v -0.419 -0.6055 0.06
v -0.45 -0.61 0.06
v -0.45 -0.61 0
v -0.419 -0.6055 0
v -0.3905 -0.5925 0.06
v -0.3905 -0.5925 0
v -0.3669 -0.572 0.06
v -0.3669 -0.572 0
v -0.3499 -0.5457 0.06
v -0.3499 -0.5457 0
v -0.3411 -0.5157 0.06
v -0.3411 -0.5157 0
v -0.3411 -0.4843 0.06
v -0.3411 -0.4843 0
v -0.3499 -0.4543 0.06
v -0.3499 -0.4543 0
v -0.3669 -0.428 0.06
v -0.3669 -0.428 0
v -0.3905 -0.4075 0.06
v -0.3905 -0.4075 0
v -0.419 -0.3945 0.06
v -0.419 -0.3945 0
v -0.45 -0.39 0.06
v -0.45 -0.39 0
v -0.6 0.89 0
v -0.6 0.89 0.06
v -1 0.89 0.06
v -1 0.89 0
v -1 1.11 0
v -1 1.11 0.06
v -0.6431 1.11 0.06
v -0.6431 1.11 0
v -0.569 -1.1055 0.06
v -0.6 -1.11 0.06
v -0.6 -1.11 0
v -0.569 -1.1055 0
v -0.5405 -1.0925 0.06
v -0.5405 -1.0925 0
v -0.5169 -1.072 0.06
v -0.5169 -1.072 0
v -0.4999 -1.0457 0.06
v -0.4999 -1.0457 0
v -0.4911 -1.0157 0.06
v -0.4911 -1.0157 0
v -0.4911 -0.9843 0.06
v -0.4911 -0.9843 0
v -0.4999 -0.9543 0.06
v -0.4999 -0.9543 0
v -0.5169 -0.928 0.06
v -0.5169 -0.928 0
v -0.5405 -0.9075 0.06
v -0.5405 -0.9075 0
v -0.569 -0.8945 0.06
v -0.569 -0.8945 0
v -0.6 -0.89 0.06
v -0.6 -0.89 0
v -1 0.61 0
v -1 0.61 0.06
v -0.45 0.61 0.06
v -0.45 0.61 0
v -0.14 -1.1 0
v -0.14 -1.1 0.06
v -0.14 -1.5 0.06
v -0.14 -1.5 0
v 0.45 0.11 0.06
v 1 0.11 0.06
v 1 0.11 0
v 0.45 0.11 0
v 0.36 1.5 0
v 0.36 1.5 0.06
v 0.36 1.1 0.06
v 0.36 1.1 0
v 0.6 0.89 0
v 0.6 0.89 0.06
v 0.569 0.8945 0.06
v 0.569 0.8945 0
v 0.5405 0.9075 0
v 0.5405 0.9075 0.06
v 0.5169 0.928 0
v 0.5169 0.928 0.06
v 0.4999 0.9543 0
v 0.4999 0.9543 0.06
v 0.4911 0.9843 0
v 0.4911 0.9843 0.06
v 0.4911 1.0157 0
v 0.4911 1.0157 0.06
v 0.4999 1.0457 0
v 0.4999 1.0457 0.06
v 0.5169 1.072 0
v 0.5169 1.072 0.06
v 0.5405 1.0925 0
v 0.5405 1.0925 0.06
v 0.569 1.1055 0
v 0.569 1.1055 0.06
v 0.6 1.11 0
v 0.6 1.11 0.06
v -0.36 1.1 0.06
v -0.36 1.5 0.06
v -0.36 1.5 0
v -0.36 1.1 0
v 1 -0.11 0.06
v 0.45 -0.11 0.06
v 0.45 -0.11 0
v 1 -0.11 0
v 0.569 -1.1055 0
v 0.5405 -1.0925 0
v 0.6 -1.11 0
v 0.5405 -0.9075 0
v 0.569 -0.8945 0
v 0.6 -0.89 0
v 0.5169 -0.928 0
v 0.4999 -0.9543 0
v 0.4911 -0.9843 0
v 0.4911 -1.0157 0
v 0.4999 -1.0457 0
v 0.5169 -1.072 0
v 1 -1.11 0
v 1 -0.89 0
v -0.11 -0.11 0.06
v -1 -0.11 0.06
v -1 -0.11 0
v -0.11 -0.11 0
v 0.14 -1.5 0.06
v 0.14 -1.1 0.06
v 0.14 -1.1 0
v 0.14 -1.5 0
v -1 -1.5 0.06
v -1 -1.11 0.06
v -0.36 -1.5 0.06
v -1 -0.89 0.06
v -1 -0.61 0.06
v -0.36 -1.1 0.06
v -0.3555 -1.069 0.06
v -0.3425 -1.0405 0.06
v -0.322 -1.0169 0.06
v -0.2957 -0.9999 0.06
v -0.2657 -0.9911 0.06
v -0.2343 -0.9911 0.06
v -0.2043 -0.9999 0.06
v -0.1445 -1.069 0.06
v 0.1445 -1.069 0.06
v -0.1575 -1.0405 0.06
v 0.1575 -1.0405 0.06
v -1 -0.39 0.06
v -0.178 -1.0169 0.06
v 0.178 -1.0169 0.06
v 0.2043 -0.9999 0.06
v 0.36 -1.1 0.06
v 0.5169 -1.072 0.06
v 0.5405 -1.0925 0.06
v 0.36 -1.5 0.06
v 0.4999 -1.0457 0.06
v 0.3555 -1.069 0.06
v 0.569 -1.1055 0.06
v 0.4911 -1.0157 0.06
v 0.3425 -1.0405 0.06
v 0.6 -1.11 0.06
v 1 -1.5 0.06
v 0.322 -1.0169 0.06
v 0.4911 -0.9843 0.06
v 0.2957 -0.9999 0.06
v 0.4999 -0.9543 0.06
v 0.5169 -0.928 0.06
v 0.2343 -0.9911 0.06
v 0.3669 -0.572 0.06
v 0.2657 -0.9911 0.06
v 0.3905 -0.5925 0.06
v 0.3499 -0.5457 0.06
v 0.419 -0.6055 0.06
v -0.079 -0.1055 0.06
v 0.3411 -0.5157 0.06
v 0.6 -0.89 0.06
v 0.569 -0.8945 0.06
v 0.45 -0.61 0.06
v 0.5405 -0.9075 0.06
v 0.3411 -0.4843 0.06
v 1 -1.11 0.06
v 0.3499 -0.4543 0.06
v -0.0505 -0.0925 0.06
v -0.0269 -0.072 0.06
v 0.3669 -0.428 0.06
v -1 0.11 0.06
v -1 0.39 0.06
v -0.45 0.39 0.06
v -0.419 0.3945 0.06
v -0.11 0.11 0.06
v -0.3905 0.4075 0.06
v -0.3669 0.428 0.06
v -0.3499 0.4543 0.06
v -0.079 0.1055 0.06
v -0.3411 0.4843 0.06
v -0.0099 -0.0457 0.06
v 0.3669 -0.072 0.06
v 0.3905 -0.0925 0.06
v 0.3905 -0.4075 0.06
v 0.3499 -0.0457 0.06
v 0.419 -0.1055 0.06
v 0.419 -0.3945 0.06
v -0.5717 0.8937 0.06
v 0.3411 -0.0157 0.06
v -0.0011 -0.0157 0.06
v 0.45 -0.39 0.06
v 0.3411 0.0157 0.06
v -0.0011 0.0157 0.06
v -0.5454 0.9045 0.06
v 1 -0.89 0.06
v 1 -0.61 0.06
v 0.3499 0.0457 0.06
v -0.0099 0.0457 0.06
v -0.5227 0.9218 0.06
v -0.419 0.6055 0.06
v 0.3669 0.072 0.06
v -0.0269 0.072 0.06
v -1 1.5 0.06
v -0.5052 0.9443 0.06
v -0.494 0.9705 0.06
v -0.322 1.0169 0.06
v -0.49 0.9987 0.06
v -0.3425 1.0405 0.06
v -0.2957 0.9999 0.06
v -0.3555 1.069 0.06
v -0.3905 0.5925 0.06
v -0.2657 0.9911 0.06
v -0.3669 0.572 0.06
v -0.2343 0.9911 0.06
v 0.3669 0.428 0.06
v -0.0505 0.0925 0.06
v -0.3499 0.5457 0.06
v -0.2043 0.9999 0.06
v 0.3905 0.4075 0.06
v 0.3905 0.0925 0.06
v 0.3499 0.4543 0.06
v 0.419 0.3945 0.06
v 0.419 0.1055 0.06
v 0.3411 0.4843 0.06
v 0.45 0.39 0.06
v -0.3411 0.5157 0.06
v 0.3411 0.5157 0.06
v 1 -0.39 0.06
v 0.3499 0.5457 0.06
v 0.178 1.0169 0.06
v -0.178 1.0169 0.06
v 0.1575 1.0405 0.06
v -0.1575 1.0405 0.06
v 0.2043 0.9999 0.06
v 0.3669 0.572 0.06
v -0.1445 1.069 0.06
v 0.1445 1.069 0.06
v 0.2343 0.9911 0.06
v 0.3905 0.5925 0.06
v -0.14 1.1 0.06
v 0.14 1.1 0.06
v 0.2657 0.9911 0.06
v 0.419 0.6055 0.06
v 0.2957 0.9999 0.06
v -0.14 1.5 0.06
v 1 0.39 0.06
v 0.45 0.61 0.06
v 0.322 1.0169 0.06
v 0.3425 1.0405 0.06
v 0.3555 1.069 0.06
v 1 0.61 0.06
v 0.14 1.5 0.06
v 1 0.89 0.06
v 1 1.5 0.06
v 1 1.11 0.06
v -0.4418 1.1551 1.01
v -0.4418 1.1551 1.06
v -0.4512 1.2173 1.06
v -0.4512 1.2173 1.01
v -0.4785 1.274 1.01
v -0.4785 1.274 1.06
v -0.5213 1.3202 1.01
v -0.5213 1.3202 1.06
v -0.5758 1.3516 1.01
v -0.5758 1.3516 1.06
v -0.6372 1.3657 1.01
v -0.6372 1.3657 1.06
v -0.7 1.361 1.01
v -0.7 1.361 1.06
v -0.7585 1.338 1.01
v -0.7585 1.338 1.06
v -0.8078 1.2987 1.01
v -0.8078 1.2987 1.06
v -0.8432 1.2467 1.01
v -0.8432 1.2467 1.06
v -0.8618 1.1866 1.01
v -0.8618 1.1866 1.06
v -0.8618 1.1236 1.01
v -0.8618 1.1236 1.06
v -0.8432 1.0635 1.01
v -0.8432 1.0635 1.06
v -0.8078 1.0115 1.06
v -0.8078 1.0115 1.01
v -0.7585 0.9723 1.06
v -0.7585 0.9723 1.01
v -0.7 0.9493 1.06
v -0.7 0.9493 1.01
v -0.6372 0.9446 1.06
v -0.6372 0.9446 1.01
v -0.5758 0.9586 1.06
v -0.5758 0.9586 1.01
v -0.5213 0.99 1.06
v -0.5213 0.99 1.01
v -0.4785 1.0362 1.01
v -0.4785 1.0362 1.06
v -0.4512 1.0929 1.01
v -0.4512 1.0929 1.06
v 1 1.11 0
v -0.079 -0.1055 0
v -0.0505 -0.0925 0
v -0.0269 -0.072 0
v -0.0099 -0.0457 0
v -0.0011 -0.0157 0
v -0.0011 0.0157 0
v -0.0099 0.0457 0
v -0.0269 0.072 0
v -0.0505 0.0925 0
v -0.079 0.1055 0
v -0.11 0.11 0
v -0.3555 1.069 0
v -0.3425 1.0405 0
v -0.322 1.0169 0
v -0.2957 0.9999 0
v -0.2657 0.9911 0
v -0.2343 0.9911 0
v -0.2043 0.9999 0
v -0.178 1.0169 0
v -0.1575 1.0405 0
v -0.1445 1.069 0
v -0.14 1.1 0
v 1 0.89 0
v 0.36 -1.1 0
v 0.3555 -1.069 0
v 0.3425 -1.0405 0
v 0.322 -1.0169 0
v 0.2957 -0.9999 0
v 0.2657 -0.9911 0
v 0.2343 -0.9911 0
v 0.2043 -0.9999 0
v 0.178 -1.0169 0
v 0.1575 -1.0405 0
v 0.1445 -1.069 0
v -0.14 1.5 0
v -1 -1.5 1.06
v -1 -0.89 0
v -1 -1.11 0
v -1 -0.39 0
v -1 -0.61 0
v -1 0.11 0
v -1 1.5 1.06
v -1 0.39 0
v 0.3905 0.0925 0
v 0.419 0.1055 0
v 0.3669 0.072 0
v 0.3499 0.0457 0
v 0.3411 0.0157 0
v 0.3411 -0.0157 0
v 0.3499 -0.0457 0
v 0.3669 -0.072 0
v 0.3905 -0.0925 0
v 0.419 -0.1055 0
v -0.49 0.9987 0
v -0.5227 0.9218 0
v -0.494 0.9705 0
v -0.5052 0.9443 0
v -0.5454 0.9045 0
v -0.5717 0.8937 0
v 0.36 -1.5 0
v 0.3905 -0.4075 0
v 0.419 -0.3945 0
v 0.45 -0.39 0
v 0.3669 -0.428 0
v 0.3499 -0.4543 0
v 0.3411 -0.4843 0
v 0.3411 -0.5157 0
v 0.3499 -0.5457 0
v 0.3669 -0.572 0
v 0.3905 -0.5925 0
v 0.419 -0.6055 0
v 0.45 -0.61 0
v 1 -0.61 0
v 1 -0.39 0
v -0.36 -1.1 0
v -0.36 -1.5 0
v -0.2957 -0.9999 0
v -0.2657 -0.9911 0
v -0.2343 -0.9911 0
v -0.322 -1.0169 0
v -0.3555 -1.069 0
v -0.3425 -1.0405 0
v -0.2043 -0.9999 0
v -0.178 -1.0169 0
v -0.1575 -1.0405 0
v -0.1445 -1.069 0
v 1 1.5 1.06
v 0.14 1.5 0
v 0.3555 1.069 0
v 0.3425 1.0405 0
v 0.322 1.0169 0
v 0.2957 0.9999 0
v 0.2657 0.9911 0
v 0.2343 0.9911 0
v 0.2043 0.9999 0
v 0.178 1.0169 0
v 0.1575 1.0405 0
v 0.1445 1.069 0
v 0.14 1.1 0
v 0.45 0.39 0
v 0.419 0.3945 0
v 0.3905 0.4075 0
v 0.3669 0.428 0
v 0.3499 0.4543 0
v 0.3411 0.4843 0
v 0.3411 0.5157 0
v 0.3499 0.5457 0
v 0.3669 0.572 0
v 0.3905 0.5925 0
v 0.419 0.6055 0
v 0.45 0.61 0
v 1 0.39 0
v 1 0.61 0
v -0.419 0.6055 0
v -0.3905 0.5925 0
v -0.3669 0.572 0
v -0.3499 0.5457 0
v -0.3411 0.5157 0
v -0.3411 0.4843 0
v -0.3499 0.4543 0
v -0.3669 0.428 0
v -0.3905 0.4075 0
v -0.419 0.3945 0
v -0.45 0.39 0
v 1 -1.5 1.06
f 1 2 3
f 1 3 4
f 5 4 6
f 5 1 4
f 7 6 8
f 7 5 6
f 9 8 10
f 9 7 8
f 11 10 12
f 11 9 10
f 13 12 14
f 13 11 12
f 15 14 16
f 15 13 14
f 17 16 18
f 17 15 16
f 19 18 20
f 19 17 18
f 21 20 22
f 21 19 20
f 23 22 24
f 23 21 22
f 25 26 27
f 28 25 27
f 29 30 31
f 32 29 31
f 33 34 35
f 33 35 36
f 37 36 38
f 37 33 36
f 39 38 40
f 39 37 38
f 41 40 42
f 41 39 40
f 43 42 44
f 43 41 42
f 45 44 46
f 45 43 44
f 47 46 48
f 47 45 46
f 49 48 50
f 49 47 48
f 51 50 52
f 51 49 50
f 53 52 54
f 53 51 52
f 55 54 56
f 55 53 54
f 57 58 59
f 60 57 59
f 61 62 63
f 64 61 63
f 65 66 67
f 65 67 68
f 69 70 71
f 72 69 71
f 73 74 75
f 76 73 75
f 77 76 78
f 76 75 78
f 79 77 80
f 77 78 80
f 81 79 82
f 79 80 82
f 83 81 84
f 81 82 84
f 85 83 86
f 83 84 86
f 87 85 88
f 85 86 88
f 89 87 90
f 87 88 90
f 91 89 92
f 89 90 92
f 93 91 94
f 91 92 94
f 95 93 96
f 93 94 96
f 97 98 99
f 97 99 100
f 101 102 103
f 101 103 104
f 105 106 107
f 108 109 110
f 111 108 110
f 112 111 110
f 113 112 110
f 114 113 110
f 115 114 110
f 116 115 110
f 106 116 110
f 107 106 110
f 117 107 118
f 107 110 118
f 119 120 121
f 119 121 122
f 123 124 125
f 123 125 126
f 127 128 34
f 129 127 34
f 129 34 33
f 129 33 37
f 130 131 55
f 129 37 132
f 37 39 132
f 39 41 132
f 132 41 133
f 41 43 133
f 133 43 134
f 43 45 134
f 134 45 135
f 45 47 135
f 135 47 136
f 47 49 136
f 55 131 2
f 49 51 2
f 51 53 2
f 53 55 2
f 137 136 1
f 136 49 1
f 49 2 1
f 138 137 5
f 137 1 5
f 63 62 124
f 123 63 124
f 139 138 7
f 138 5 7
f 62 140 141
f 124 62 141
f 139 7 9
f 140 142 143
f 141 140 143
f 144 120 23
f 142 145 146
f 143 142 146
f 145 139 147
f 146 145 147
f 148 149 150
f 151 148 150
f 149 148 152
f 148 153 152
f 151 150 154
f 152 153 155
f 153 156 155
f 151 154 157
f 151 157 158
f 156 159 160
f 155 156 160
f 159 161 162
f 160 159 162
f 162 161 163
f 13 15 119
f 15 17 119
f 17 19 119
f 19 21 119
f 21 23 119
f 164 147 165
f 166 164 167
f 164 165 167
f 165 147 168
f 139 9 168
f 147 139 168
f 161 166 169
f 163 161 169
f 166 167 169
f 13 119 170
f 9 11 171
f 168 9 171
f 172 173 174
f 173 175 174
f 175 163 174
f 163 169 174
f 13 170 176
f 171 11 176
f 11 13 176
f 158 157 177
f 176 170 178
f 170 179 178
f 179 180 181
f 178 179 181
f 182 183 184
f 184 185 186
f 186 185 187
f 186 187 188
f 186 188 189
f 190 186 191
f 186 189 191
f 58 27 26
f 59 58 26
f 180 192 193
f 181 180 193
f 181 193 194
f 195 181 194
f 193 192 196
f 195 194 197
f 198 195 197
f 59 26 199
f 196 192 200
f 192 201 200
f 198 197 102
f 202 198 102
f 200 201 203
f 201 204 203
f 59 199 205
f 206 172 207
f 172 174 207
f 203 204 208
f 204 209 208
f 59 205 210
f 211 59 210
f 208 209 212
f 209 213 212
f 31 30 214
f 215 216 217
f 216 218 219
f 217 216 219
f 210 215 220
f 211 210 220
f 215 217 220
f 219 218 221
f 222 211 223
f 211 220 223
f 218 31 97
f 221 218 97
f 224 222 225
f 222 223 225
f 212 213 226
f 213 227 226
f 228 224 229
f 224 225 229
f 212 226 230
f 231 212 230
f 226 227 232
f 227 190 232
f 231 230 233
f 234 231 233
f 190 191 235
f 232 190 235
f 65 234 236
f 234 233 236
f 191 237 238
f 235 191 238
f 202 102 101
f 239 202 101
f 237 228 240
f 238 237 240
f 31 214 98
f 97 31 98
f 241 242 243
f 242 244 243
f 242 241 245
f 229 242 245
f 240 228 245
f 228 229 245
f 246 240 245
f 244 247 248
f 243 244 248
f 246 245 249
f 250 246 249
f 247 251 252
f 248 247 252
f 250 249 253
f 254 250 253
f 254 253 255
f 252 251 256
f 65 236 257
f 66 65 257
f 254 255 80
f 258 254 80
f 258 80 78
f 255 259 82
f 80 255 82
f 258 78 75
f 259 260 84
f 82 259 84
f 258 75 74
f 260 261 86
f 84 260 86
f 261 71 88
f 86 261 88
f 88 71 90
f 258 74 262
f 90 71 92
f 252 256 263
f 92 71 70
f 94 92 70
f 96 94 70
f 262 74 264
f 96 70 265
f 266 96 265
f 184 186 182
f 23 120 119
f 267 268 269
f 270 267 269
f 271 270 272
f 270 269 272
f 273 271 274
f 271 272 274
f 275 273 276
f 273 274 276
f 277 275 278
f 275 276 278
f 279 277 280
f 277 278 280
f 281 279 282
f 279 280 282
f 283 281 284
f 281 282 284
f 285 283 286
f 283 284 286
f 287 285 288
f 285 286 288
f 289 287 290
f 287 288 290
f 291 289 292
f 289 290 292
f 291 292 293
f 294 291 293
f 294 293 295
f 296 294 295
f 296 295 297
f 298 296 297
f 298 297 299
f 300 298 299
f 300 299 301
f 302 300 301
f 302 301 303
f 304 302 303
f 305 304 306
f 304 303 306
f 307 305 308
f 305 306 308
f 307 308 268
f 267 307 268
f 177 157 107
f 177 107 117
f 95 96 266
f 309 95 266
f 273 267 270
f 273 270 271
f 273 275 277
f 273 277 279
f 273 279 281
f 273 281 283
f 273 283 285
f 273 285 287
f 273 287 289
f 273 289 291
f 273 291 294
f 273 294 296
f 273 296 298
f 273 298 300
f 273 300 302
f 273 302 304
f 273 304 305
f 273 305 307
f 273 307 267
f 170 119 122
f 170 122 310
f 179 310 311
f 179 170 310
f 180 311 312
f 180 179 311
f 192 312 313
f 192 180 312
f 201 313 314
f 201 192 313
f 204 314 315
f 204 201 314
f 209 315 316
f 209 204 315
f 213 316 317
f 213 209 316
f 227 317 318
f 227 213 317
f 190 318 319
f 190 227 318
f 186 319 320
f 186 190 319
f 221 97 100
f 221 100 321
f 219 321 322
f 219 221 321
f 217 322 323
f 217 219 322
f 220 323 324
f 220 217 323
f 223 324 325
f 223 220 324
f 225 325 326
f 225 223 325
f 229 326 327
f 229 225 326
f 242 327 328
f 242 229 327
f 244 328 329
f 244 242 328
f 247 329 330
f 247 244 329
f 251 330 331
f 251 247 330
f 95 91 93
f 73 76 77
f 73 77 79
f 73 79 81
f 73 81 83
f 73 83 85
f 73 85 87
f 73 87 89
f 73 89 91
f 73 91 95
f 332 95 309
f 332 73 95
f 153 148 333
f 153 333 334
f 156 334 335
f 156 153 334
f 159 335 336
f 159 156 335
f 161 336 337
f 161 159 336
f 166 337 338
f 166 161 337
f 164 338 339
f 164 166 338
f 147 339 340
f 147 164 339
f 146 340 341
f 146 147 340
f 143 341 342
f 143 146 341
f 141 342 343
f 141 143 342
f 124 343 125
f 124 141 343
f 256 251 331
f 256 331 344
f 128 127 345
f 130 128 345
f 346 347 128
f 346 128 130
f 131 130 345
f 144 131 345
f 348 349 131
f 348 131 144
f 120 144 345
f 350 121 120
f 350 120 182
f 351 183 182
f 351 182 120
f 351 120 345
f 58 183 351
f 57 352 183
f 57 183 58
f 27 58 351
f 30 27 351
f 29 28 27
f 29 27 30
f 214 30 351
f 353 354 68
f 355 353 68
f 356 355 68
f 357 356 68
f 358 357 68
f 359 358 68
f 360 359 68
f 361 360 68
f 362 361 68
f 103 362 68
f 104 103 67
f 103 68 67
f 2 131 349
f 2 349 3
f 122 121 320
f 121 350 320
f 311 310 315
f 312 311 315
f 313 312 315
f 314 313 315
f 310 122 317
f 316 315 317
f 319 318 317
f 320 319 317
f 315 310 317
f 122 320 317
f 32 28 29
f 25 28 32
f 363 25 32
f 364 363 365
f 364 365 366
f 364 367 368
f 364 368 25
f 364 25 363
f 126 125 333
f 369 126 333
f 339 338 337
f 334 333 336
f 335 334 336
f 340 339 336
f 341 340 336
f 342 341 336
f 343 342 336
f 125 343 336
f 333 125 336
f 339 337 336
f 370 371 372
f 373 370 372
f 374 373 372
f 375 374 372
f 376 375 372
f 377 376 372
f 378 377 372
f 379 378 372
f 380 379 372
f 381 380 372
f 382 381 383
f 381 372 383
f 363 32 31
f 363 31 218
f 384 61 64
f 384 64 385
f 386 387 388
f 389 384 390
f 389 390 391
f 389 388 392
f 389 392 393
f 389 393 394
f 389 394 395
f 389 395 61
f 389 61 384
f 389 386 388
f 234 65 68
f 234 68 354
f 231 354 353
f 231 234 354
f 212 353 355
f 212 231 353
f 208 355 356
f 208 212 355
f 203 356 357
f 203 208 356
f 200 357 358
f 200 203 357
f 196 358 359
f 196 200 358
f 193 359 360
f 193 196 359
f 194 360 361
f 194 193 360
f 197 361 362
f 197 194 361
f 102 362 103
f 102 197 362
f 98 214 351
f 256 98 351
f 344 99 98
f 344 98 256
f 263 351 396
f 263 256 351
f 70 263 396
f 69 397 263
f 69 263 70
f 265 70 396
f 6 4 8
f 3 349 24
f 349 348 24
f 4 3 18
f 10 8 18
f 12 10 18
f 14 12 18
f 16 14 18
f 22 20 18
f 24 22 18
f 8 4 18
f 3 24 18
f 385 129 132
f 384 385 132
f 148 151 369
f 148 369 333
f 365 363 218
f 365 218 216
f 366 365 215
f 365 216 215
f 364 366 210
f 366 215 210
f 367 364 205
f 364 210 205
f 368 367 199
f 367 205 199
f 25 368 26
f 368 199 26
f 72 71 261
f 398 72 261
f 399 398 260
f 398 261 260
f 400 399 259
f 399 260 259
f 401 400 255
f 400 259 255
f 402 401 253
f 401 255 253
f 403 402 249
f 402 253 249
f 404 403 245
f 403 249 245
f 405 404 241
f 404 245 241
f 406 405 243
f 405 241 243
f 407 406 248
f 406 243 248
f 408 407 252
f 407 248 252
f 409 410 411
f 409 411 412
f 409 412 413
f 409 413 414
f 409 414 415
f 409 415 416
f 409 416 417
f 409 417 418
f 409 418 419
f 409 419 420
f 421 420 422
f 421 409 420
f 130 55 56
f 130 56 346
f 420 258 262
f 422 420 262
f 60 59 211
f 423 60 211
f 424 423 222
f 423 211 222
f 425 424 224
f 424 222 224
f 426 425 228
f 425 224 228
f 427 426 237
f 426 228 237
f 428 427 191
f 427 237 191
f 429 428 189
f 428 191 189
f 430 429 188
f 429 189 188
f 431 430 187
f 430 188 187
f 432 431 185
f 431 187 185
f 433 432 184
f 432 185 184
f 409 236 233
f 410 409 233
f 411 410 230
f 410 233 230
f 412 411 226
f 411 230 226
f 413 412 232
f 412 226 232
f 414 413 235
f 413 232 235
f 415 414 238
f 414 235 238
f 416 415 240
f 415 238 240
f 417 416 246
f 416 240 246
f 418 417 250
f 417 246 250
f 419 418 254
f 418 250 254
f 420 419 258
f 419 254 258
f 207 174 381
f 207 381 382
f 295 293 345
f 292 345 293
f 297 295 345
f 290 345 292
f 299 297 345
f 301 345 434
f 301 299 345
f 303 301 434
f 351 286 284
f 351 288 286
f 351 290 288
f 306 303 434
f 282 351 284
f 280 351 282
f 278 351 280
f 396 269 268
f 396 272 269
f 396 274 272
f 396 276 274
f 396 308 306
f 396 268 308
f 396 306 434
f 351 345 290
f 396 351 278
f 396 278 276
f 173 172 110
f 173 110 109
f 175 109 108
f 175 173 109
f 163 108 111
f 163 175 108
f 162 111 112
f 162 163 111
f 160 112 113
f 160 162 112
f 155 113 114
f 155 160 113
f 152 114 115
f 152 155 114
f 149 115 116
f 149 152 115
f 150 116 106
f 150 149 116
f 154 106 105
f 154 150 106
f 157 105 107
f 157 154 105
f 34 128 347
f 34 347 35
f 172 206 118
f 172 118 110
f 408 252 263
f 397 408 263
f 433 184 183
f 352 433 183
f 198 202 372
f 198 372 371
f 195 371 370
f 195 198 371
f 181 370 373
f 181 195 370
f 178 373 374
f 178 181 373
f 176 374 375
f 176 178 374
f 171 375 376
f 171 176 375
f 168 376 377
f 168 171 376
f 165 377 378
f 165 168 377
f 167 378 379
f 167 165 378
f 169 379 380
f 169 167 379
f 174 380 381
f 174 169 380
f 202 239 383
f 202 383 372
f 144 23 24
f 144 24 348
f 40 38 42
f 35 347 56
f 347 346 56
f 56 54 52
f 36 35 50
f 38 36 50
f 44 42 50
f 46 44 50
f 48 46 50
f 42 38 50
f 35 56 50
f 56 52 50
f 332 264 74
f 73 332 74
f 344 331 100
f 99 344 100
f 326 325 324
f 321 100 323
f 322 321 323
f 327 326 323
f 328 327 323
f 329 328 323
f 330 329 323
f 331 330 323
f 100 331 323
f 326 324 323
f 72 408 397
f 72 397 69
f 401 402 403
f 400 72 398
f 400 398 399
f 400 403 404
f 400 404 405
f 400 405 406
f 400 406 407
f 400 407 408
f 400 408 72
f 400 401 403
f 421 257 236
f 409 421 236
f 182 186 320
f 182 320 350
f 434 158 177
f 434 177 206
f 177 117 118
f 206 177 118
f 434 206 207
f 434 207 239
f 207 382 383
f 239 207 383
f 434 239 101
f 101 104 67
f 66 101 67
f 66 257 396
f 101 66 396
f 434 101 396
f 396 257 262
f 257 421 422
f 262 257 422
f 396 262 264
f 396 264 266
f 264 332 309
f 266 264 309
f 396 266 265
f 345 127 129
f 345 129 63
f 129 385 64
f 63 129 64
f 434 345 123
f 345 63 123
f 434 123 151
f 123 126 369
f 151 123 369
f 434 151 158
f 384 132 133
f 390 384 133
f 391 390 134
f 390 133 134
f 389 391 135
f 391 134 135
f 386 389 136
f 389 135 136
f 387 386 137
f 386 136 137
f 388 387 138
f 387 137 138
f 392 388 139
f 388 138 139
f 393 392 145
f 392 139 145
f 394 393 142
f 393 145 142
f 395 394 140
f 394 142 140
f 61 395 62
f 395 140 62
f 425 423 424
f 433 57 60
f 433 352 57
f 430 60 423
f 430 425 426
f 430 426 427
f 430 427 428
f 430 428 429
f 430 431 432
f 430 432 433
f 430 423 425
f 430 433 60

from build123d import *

# Parameters (mm, degrees)
BOSS_EXTRUDE1_START = 0.06
SKETCH1_W           = 2
SKETCH1_H           = 3
BOSS_EXTRUDE1_DEPTH = 1
BOSS_EXTRUDE2_DEPTH = 0.06
CUT_EXTRUDE2_DEPTH  = 0.06
SKETCH2_R           = 0.211135496
CUT_EXTRUDE3_DEPTH  = 0.05


with BuildPart() as part:
    # Sketch1 → Boss-Extrude1 (new body)
    with BuildSketch(Plane.XY.offset(BOSS_EXTRUDE1_START)):
        Rectangle(SKETCH1_W, SKETCH1_H)
    extrude(amount=BOSS_EXTRUDE1_DEPTH)

    # Sketch3 → Boss-Extrude2 (add)
    with BuildSketch(Plane(origin=(0, 0, 0.06), x_dir=(-1, 0, 0), z_dir=(0, 0, -1))):
        with BuildLine():
            Line((1, -0.11), (0.11, -0.11))
            ThreePointArc((0.11, -0.11), (0, 0), (0.11, 0.11))
            Line((0.11, 0.11), (1, 0.11))
            Line((1, 0.11), (1, -0.11))
        make_face()
        with BuildLine():
            Line((1, -0.61), (0.45, -0.61))
            ThreePointArc((0.45, -0.61), (0.34, -0.5), (0.45, -0.39))
            Line((0.45, -0.39), (1, -0.39))
            Line((1, -0.39), (1, -0.61))
        make_face()
        with BuildLine():
            Line((1, -1.11), (0.6, -1.11))
            ThreePointArc((0.6, -1.11), (0.49, -1), (0.6, -0.89))
            Line((0.6, -0.89), (1, -0.89))
            Line((1, -0.89), (1, -1.11))
        make_face()
        with BuildLine():
            Line((-1, 0.11), (-0.45, 0.11))
            ThreePointArc((-0.45, 0.11), (-0.34, 0), (-0.45, -0.11))
            Line((-0.45, -0.11), (-1, -0.11))
            Line((-1, -0.11), (-1, 0.11))
        make_face()
        with BuildLine():
            Line((-1, -0.61), (-1, -0.39))
            Line((-1, -0.39), (-0.45, -0.39))
            ThreePointArc((-0.45, -0.39), (-0.34, -0.5), (-0.45, -0.61))
            Line((-0.45, -0.61), (-1, -0.61))
        make_face()
        with BuildLine():
            Line((-1, -1.11), (-1, -0.89))
            Line((-1, -0.89), (-0.6, -0.89))
            ThreePointArc((-0.6, -0.89), (-0.49, -1), (-0.6, -1.11))
            Line((-0.6, -1.11), (-1, -1.11))
        make_face()
        with BuildLine():
            Line((-0.36, -1.5), (-0.36, -1.1))
            ThreePointArc((-0.36, -1.1), (-0.25, -0.99), (-0.14, -1.1))
            Line((-0.14, -1.1), (-0.14, -1.5))
            Line((-0.14, -1.5), (-0.36, -1.5))
        make_face()
        with BuildLine():
            Line((0.36, -1.5), (0.36, -1.1))
            ThreePointArc((0.36, -1.1), (0.25, -0.99), (0.14, -1.1))
            Line((0.14, -1.1), (0.14, -1.5))
            Line((0.14, -1.5), (0.36, -1.5))
        make_face()
    boss_extrude2 = extrude(amount=BOSS_EXTRUDE2_DEPTH)

    # Mirror1: Boss-Extrude2 across plane
    add(boss_extrude2.mirror(Plane.ZX))

    # Sketch4 → Cut-Extrude2 (cut)
    with BuildSketch(Plane(origin=(0, 0, 0), x_dir=(-1, 0, 0), z_dir=(0, 0, -1))):
        Polygon((0.672992218, 1.131770283), (0.453793128, 0.972393156), (0.453793128, 1.155108585), align=None)
    extrude(amount=-CUT_EXTRUDE2_DEPTH, mode=Mode.SUBTRACT)

    # Sketch2 → Cut-Extrude3 (cut)
    with BuildSketch(Plane.XY.offset(1.06)):
        with Locations((-0.652977304, 1.155108585)):
            Circle(SKETCH2_R)
    extrude(amount=-CUT_EXTRUDE3_DEPTH, mode=Mode.SUBTRACT)


solid = part.part
